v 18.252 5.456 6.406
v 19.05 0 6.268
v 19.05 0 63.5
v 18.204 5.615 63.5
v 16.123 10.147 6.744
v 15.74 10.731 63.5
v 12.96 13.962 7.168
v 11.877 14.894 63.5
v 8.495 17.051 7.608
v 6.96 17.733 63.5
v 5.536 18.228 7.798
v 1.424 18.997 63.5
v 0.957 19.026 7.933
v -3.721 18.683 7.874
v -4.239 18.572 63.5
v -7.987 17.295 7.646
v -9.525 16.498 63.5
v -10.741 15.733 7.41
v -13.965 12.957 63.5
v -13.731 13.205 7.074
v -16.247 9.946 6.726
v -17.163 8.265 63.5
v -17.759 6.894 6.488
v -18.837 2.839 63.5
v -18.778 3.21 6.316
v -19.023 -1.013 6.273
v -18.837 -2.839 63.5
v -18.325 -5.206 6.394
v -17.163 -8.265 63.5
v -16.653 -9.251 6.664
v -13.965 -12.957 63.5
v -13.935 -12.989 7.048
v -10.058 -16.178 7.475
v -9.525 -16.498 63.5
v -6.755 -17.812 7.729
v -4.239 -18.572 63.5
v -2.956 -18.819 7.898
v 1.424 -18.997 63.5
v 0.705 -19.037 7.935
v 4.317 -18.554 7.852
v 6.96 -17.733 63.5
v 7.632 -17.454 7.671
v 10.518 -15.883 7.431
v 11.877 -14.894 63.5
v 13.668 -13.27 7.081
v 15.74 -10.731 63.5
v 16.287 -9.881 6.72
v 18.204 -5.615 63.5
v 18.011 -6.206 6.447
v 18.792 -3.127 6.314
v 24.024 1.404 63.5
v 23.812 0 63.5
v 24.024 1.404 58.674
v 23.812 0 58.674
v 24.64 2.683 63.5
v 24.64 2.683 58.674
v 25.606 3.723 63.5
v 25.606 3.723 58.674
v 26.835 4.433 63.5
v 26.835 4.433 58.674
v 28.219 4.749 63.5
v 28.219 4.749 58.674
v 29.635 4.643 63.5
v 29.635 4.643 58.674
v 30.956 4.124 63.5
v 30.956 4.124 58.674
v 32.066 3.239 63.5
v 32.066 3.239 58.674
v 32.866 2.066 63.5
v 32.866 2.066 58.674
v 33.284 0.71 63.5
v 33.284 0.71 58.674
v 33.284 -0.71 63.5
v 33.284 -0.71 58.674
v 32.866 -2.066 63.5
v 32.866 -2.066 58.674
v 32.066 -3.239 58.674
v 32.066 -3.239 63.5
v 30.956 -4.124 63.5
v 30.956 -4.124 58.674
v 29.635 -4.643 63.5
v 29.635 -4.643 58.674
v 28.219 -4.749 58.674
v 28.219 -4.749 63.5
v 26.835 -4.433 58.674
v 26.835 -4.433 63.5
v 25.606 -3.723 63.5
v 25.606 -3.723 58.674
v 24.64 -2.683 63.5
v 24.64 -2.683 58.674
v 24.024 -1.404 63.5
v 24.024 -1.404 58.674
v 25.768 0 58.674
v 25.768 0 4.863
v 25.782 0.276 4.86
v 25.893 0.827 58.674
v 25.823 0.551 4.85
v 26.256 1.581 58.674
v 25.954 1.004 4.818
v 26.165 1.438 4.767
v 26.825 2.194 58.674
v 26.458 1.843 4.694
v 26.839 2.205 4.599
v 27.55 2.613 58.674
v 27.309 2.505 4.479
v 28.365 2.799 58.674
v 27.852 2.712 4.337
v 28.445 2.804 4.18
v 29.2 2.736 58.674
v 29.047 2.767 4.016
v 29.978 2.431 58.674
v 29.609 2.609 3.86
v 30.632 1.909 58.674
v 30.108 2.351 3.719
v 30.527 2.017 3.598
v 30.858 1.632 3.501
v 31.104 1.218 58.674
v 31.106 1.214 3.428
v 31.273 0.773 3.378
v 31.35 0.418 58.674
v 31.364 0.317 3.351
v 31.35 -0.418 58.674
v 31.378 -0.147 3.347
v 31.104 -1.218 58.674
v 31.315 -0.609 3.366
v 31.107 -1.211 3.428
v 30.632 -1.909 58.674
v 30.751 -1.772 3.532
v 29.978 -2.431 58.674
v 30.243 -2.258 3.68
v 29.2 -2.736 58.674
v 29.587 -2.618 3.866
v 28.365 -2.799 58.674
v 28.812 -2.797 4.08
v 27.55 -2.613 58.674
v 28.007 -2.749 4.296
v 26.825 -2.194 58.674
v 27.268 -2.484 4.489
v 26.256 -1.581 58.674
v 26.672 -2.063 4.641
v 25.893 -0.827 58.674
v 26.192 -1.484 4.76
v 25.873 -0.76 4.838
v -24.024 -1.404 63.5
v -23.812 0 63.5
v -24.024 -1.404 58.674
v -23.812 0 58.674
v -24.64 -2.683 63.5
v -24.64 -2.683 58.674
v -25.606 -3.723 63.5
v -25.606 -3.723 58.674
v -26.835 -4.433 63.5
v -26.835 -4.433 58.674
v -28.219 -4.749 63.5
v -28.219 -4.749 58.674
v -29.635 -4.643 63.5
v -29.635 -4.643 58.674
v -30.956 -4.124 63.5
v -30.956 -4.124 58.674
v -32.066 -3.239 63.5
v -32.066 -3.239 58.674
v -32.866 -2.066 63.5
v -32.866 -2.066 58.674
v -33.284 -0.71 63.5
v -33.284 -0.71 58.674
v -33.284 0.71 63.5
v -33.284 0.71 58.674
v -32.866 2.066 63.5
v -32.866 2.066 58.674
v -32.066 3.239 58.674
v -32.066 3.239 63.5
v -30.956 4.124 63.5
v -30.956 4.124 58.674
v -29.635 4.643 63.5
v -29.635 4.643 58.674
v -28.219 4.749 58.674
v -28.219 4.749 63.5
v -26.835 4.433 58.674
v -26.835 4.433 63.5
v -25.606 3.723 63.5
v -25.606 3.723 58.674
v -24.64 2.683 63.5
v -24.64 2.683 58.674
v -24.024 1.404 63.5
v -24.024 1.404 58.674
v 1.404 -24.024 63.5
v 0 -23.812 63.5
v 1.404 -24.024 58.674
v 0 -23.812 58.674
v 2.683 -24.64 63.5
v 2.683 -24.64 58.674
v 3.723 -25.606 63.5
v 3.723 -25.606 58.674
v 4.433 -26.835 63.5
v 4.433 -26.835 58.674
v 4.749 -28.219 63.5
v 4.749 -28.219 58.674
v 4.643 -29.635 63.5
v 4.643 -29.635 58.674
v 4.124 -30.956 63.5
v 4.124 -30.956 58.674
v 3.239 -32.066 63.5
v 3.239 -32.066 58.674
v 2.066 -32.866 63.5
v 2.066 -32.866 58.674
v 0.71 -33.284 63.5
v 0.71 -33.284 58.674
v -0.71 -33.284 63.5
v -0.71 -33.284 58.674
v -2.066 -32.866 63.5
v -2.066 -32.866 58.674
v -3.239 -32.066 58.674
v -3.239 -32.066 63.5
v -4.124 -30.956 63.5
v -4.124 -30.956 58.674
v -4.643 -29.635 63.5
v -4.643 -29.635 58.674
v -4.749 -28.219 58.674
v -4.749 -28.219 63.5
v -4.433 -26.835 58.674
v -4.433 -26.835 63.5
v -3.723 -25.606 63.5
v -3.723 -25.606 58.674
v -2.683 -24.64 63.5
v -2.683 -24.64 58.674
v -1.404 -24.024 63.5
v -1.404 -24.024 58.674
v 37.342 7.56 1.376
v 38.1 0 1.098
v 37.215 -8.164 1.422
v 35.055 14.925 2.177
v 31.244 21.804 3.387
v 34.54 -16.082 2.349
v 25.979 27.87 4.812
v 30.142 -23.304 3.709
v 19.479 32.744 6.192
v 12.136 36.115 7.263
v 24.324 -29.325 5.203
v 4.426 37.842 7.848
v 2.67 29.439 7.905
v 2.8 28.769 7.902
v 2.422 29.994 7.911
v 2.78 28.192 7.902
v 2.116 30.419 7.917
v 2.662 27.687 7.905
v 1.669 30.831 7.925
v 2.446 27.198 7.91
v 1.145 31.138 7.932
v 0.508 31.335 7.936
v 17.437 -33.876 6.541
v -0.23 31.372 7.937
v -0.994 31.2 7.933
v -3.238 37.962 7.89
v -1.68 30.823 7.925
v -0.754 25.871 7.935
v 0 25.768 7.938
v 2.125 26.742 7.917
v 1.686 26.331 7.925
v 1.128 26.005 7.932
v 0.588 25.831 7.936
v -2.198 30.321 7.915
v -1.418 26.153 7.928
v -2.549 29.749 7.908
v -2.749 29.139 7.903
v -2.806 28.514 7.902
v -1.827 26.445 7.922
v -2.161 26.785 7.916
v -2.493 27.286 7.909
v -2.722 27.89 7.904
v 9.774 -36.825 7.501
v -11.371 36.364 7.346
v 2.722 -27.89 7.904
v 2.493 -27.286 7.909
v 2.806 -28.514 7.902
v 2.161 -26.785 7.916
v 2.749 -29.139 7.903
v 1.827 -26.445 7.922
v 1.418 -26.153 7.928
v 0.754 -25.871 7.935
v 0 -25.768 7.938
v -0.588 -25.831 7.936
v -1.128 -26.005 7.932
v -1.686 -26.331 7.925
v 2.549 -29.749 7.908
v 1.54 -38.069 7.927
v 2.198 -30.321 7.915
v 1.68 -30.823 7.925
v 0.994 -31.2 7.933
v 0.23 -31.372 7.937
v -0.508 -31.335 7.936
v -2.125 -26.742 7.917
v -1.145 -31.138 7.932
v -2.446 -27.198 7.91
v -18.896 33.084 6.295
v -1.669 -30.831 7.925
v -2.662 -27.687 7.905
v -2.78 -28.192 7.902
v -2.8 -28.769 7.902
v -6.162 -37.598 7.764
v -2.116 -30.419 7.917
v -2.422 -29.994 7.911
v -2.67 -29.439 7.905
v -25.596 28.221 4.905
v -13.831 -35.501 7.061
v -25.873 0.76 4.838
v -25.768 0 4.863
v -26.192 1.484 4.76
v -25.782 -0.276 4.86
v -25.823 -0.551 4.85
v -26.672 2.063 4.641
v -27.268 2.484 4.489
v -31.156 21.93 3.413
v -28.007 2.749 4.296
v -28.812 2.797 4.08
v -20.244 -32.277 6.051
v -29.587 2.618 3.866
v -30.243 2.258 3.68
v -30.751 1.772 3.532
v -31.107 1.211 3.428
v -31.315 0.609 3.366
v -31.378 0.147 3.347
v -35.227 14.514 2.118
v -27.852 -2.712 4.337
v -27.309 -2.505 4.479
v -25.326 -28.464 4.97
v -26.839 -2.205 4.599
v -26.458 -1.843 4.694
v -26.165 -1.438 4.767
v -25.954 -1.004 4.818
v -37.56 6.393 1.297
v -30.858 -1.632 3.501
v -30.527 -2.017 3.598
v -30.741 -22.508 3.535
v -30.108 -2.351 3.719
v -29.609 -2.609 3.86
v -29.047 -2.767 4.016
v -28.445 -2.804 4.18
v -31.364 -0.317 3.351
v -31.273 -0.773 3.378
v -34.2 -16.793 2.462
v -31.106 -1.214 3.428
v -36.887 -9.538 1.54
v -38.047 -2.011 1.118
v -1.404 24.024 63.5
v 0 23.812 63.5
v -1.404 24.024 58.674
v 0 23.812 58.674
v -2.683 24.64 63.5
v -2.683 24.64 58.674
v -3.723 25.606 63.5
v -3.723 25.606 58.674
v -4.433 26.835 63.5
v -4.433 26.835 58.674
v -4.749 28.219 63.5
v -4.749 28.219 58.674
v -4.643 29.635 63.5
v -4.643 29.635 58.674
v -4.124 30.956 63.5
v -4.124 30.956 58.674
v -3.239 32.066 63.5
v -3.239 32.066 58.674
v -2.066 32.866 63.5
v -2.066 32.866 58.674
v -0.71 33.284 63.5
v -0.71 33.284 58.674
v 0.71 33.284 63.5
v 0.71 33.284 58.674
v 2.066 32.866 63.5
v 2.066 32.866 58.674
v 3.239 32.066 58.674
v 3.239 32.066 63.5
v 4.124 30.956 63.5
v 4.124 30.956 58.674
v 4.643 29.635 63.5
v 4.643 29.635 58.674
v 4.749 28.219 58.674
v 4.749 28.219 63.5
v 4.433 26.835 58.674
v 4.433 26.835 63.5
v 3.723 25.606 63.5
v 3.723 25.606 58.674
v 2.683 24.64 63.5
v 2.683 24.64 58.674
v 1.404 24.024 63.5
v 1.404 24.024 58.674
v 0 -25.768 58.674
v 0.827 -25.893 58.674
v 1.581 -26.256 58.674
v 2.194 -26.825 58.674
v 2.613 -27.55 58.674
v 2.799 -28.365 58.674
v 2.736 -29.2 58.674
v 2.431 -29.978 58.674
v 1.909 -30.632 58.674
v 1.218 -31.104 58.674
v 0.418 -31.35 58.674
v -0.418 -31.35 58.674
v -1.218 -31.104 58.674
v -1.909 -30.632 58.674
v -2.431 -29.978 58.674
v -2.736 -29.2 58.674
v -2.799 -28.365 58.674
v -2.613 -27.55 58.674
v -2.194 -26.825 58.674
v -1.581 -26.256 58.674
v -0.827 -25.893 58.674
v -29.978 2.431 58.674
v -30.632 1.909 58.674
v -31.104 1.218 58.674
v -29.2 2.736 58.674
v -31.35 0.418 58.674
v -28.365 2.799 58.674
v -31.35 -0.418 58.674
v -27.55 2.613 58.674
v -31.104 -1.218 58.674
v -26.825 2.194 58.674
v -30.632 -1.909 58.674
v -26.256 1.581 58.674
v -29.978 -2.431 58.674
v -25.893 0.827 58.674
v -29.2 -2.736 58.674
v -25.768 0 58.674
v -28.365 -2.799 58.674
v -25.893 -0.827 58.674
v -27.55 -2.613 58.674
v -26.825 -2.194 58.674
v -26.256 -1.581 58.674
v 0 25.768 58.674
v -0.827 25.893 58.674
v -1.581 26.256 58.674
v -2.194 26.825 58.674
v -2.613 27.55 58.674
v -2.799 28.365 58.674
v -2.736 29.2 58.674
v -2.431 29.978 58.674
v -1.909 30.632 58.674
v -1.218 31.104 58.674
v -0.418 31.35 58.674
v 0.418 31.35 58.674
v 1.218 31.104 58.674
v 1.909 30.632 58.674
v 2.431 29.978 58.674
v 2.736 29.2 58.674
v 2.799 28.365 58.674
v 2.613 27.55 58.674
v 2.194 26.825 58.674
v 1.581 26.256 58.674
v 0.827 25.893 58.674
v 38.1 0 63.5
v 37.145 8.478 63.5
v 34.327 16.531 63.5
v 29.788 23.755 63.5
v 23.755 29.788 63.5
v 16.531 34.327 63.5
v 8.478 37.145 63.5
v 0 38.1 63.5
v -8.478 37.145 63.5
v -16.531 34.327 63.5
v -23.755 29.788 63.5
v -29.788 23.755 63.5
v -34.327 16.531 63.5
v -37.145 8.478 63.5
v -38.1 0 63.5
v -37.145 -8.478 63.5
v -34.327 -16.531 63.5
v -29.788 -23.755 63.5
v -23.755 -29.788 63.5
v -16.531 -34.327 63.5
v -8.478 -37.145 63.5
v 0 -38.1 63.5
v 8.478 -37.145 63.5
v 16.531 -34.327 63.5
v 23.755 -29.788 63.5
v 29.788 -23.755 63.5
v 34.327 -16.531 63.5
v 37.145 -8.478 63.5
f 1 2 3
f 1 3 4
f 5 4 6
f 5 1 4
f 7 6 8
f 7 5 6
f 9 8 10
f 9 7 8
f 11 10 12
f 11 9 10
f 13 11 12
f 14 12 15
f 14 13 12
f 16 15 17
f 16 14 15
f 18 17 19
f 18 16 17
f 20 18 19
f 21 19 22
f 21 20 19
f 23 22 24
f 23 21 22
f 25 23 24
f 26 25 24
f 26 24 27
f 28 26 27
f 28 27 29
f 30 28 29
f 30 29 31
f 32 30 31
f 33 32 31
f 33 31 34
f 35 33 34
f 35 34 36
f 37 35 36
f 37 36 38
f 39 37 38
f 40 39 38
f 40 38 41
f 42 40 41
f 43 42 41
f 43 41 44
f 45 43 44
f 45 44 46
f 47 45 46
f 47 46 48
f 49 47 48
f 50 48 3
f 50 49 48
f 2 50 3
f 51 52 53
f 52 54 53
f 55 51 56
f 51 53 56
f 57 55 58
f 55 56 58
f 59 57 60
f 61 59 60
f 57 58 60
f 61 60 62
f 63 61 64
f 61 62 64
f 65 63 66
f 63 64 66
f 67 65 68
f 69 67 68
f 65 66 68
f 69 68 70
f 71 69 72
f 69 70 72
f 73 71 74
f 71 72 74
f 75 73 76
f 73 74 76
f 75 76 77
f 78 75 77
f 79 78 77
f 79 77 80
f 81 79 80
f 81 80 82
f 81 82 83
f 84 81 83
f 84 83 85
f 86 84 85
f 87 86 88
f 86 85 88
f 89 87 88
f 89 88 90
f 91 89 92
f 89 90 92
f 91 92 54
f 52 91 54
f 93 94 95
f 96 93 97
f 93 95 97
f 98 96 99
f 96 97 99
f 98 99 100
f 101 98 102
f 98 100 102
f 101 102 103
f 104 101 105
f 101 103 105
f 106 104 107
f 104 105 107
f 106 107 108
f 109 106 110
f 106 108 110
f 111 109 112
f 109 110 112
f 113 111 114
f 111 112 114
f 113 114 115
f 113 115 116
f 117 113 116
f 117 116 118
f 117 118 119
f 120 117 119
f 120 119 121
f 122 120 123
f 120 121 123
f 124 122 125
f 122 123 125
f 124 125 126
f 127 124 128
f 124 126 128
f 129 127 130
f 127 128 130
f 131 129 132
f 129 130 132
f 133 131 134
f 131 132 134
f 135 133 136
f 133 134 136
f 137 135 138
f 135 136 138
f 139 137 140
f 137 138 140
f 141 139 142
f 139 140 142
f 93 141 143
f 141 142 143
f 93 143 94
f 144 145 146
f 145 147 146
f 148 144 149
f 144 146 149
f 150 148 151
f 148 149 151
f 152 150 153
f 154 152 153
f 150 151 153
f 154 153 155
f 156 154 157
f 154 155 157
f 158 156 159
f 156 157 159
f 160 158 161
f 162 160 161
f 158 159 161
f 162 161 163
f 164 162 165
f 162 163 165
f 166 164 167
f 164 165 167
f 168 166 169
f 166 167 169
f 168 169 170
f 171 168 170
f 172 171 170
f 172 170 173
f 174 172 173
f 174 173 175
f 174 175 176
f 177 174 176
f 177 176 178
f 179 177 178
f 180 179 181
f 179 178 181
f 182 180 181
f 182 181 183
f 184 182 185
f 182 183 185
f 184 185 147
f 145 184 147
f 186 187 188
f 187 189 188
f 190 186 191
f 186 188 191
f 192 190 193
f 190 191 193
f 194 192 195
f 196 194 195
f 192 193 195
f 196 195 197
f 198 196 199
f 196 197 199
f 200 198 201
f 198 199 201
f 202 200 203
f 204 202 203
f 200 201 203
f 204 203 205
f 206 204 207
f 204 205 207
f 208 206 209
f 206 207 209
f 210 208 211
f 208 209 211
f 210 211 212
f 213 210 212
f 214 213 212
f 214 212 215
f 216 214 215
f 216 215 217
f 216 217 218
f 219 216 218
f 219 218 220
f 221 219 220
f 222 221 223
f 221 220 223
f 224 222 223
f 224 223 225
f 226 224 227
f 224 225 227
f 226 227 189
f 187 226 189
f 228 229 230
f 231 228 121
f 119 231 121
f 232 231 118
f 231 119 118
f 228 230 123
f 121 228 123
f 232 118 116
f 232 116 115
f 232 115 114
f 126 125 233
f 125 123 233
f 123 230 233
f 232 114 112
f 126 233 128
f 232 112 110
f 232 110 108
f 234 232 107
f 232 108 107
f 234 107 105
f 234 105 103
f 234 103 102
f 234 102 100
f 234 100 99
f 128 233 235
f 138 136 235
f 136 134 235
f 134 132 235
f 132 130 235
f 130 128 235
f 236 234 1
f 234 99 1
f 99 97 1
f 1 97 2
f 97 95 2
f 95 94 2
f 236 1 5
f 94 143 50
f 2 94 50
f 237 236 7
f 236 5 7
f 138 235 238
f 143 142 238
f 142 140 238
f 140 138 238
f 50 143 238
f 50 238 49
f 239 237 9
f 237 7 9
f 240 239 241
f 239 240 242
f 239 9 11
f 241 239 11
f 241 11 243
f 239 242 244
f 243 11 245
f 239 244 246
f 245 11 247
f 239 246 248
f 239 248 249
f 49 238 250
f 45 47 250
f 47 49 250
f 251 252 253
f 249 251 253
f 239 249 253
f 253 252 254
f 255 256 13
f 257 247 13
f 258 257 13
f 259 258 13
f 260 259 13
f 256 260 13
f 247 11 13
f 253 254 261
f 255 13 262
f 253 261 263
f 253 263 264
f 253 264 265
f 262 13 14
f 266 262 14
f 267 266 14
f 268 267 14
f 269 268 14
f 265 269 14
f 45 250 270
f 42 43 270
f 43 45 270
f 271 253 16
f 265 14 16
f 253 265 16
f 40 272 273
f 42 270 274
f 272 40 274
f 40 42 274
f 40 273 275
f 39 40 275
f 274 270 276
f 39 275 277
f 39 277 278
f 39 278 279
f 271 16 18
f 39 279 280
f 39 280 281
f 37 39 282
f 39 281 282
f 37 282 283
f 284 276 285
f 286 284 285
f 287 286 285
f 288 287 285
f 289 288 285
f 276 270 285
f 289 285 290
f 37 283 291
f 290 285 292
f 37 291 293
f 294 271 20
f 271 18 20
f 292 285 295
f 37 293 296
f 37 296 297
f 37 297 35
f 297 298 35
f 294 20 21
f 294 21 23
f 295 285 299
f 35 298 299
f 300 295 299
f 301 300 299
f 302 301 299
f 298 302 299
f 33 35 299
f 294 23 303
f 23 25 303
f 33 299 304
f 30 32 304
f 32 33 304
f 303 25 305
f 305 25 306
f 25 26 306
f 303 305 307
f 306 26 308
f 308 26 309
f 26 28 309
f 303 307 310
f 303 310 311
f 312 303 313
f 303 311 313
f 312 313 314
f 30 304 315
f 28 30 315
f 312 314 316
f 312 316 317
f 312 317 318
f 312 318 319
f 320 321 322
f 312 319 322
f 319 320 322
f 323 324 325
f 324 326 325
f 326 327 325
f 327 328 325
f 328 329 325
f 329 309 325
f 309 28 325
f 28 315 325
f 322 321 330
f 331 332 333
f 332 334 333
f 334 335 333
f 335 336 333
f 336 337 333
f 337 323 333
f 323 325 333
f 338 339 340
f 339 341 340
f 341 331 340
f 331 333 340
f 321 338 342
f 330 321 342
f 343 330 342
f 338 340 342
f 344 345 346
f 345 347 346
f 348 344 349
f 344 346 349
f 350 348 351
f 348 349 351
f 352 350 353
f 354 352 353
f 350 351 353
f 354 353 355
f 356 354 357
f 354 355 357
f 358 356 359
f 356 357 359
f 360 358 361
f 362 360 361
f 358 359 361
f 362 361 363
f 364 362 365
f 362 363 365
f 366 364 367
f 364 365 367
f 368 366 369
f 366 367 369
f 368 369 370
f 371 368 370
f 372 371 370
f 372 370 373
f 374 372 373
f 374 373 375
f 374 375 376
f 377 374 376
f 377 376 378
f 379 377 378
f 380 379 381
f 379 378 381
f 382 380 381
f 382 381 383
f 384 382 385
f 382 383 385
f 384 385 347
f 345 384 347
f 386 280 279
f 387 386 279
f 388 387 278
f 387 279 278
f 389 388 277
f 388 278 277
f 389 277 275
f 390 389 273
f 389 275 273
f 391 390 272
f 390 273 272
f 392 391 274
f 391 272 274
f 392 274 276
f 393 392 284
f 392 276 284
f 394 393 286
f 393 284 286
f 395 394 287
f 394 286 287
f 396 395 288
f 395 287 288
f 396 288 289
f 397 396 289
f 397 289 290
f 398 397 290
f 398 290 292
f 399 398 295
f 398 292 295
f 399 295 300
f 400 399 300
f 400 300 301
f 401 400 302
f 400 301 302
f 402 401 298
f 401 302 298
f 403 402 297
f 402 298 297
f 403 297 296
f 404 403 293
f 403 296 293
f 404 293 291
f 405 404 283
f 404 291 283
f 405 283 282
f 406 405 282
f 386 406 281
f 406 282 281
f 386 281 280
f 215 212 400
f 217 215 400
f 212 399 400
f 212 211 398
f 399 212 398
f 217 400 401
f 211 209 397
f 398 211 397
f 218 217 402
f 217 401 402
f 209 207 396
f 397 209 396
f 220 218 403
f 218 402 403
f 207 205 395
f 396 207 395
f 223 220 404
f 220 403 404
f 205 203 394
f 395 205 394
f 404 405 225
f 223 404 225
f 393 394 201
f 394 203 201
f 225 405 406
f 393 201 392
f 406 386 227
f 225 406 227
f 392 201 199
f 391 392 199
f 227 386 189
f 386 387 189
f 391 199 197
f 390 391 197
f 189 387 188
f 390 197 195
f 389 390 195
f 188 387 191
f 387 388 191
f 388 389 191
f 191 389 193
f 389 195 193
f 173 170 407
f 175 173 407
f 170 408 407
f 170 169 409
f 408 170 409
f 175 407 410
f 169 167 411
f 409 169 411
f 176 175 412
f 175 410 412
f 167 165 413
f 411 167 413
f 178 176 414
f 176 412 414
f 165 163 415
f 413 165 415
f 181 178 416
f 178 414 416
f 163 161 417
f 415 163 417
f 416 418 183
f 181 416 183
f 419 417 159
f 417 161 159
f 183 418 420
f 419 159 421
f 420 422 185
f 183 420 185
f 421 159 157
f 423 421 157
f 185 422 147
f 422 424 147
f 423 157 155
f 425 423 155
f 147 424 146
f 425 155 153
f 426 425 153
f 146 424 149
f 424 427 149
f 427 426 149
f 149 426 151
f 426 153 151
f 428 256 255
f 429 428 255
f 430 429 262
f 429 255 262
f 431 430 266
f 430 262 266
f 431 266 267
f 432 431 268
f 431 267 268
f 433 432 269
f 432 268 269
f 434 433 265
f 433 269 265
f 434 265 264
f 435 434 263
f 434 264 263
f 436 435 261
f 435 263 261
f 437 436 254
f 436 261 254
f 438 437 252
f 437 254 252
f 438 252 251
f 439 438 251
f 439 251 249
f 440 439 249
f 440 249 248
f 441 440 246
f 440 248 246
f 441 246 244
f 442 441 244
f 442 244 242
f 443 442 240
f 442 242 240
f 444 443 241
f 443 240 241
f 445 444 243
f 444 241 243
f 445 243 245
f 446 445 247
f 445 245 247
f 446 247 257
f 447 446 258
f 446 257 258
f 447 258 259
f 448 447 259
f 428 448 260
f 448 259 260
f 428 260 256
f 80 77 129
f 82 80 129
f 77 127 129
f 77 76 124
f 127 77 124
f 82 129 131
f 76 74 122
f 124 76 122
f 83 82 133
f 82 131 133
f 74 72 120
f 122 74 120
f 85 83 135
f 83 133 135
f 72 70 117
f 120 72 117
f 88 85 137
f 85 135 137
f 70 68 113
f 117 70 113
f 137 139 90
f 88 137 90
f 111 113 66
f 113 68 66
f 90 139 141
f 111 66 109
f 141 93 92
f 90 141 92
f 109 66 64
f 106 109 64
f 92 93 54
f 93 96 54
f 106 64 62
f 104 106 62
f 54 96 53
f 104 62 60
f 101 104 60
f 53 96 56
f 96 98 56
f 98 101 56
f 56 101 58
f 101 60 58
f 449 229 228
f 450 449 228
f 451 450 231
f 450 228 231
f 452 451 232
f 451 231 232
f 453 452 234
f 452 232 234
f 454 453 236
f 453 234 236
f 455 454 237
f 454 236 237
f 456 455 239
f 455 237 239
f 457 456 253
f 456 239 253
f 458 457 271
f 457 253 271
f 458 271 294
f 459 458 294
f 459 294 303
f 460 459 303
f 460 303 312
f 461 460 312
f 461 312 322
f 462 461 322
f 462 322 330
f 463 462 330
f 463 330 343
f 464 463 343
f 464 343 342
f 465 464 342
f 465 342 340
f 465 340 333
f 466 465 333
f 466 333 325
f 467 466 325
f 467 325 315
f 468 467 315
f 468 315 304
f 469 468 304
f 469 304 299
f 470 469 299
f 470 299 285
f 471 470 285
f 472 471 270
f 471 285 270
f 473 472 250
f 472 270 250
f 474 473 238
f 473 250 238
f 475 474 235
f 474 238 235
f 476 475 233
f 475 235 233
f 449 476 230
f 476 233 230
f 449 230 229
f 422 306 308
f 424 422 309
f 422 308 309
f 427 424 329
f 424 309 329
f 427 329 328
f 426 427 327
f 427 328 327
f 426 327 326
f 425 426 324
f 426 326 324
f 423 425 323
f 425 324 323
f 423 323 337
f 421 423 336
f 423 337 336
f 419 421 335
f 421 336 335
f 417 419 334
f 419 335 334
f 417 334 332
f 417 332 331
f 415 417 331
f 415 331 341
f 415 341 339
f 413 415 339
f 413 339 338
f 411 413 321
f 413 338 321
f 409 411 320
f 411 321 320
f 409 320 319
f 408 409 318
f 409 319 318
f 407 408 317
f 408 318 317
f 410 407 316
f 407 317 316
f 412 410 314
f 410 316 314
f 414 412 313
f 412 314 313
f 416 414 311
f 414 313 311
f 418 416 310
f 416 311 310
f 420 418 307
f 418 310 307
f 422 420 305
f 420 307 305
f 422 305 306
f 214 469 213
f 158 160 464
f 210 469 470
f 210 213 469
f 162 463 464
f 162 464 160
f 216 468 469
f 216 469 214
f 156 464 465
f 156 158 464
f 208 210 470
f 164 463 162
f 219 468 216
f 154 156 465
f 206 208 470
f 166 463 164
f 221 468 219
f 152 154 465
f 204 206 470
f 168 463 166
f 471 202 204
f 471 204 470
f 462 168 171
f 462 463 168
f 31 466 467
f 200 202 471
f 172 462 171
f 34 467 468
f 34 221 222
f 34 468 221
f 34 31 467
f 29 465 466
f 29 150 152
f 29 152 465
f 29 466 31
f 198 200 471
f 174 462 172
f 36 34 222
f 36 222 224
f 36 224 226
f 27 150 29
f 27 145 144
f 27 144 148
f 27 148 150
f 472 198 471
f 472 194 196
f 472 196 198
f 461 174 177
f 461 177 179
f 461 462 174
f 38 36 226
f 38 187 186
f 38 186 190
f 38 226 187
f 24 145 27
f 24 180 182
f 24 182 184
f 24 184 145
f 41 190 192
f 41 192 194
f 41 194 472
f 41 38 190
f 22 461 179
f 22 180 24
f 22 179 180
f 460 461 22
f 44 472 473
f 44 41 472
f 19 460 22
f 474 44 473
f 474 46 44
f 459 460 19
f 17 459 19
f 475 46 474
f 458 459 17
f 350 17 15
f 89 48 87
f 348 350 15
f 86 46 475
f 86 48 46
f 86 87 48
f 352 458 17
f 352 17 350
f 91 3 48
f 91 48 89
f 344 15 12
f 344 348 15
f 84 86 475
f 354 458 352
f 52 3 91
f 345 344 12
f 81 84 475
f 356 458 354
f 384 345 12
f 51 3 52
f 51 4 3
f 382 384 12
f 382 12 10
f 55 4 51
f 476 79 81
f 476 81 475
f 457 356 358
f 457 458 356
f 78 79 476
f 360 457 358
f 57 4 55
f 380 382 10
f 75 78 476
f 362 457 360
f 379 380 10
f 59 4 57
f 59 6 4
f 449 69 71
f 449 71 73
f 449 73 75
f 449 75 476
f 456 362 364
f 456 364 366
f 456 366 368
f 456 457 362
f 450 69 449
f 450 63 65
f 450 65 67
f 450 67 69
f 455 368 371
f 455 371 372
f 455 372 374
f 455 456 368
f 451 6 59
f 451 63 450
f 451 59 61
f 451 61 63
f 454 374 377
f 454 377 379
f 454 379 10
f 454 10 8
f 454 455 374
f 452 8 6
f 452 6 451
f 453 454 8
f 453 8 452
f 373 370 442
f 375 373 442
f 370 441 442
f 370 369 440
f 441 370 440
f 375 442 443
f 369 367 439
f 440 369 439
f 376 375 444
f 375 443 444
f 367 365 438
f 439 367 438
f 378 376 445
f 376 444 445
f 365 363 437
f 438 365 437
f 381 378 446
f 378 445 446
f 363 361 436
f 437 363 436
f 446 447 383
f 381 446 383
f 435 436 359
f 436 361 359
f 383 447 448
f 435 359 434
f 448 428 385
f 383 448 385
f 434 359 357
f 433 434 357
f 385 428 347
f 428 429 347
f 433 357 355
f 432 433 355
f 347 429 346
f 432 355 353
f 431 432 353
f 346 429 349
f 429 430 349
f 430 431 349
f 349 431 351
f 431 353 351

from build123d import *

# Parameters (mm, degrees)
F0_R            = 38.1
F0_R_2          = 19.05
F1_DEPTH        = 63.5
F3_COPIES_COUNT = 4
F4_R            = 109.5375
F5_DEPTH        = 38.101
F5_DEPTH_BACK   = 38.101


# Not quite as in the source:
# - a pattern or mirror of a feature is missing from the dataset's text; its kind, count and spacing are read off the source's solid


with BuildPart() as f1:
    # F0 (on Top) → F1 (new body)
    with BuildSketch(Plane.XY):
        Circle(F0_R)
        Circle(F0_R_2, mode=Mode.SUBTRACT)
    extrude(amount=F1_DEPTH)

    # F2 (on Front) → F3 (revolve, cut)
    with BuildSketch(Plane.XZ):
        Polygon((28.575, 0), (28.575, 63.5), (23.8125, 63.5), (23.8125, 58.674), (25.7683, 58.674), (25.7683, 0), align=None)
    f3 = revolve(axis=Axis((28.575, 0, 28.6447224574), (0, 0, -1)), mode=Mode.SUBTRACT)

    # F3_copies: F3 ×4 about axis
    f3_copies_axis = Axis((0, 0, 0), (0, 0, 1))
    for i in range(1, F3_COPIES_COUNT):
        add(f3.rotate(f3_copies_axis, i * 360 / F3_COPIES_COUNT), mode=Mode.SUBTRACT)

    # F4 (on Front) → F5 (cut, two sides)
    with BuildSketch(Plane.XZ) as f5_sk:
        with Locations((0, -101.6)):
            Circle(F4_R)
    extrude(amount=-F5_DEPTH, mode=Mode.SUBTRACT)
    extrude(f5_sk.sketch, amount=F5_DEPTH_BACK, mode=Mode.SUBTRACT)


solid = f1.part
